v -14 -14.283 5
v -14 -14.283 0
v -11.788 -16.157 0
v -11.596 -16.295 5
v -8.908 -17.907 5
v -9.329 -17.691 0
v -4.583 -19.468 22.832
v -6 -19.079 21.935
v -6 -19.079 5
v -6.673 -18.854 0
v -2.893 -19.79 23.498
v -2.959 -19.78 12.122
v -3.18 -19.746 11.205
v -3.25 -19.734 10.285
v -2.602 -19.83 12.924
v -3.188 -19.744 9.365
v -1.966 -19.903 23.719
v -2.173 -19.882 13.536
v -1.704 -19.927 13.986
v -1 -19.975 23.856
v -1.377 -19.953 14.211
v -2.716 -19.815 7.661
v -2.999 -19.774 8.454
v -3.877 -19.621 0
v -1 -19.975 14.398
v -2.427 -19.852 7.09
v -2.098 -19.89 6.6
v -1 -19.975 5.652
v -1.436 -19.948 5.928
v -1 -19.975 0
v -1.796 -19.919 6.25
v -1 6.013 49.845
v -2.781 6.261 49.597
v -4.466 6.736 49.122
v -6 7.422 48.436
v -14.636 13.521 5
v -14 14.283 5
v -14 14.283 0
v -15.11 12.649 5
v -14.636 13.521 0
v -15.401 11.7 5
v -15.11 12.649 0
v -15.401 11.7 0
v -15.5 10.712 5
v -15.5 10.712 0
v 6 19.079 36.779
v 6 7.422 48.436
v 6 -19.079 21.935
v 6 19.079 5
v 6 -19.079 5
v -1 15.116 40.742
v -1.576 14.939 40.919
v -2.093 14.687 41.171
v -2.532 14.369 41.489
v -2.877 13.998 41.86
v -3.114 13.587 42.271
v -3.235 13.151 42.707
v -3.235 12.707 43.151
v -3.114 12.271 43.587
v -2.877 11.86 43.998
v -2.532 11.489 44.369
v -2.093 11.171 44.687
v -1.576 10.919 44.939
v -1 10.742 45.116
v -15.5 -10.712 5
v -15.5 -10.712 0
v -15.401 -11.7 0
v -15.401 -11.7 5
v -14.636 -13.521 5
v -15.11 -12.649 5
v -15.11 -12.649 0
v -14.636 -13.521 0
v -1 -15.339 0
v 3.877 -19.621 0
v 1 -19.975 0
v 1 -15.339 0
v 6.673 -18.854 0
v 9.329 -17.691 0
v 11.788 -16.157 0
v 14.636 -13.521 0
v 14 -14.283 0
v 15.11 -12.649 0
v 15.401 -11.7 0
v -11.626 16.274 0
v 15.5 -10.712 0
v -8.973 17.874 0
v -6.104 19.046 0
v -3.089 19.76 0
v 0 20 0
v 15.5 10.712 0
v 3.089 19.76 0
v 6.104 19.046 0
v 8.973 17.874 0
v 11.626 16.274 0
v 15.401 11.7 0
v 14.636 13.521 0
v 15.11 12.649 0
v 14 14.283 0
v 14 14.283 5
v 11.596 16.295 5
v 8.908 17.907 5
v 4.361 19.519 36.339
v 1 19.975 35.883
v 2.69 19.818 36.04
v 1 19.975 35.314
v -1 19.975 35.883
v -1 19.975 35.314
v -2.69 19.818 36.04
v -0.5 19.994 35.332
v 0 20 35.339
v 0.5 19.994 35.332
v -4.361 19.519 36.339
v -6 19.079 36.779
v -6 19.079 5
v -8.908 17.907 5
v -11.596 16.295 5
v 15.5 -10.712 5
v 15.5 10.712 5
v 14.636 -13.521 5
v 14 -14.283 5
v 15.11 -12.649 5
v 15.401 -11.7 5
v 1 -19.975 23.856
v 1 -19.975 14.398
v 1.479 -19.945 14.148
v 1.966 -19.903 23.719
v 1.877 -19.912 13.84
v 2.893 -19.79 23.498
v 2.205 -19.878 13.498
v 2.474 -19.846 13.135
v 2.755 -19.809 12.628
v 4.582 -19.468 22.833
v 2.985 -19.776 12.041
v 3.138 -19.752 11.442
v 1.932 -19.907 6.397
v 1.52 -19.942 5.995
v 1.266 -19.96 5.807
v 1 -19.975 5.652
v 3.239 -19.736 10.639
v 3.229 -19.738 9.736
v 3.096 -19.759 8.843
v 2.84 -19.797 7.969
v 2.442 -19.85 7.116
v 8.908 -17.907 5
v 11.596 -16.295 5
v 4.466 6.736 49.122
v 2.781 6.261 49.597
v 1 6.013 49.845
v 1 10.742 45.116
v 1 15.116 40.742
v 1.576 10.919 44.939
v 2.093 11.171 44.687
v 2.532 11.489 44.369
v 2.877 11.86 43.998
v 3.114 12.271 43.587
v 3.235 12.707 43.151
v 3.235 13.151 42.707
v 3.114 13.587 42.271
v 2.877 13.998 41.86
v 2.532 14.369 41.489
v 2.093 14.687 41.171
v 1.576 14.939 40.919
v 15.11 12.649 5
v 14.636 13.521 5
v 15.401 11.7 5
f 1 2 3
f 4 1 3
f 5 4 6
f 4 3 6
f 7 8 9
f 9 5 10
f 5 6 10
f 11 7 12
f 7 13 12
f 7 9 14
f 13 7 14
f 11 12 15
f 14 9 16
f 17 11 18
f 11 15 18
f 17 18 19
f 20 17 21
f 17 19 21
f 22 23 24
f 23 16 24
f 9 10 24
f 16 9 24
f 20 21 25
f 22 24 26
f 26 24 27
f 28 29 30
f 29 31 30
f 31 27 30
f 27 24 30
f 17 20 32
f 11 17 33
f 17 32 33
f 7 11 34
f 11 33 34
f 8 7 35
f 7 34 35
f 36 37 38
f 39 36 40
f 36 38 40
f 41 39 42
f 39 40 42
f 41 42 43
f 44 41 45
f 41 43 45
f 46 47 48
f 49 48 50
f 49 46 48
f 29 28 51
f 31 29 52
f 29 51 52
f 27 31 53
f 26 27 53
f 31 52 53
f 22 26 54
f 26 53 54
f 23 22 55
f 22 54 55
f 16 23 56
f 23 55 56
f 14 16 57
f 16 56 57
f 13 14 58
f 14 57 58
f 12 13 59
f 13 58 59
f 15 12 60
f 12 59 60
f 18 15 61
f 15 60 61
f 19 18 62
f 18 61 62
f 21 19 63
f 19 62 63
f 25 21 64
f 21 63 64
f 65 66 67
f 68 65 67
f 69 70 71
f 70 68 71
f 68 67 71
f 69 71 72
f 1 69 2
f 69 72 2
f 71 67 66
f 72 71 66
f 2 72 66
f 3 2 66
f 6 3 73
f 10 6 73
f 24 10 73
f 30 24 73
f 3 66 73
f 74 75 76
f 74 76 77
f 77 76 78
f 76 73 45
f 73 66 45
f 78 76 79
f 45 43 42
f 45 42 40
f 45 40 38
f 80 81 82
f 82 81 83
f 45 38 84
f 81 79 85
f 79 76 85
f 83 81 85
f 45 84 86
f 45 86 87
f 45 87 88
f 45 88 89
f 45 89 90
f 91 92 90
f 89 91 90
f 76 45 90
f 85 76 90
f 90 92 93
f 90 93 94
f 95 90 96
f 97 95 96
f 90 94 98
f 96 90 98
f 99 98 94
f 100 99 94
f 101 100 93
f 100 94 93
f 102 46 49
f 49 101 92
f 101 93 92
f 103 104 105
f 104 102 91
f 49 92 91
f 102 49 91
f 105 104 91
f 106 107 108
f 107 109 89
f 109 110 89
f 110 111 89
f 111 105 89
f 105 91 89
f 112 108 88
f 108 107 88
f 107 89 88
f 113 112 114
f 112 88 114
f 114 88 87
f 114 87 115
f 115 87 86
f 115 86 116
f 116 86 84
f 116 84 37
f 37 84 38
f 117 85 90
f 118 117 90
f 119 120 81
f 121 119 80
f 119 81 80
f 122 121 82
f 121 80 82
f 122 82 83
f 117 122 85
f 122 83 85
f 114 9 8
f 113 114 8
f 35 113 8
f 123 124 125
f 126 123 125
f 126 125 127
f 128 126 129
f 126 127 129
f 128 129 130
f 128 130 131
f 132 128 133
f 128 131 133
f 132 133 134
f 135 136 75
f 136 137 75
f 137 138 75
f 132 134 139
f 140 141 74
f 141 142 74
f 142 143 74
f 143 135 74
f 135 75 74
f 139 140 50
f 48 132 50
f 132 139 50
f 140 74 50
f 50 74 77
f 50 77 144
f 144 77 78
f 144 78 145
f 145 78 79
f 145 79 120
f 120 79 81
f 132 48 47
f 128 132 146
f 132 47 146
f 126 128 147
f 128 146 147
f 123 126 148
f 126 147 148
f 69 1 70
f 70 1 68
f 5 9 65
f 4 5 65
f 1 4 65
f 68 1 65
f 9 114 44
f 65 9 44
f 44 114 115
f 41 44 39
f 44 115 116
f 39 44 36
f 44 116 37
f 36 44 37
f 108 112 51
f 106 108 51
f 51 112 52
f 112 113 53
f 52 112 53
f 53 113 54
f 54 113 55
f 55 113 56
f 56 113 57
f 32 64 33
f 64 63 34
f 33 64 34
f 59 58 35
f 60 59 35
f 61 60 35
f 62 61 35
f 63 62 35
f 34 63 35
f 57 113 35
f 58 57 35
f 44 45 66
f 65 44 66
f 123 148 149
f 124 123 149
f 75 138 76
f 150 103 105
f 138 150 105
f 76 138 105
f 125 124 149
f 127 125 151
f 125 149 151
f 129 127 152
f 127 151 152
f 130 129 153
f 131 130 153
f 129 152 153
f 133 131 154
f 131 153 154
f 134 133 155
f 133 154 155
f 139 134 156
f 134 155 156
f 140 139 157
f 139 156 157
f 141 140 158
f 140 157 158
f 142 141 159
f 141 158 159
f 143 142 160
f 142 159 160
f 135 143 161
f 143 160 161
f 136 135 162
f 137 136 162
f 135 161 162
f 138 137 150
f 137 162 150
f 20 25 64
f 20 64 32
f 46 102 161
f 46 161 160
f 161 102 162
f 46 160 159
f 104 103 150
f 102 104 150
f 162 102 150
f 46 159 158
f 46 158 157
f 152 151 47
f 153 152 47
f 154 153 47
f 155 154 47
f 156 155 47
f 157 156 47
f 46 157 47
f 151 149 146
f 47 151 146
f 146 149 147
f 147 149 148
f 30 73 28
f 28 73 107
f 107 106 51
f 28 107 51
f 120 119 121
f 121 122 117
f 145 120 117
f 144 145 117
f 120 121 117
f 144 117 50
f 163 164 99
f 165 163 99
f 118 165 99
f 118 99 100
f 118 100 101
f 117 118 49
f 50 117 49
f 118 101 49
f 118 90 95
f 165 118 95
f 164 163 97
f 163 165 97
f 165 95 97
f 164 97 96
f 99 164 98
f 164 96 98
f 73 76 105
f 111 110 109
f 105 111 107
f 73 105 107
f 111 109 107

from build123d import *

# Parameters (mm, degrees)
BOSS_EXTRUDE1_DEPTH     = 50
CUT_EXTRUDE2_DEPTH      = 21
CUT_EXTRUDE2_DEPTH_BACK = 21
CUT_EXTRUDE3_DEPTH      = 10.5
CUT_EXTRUDE3_DEPTH_BACK = 22.5
CUT_EXTRUDE4_DEPTH      = 54.639610307


with BuildPart() as part:
    # Sketch1 → Boss-Extrude1 (new body)
    with BuildSketch(Plane.XY):
        with BuildLine():
            Line((-15.5, 10.712142643), (-15.5, -10.712142643))
            ThreePointArc((-15.5, -10.712142643), (-15.109772229, -12.648634316), (-14, -14.282856857))
            ThreePointArc((-14, -14.282856857), (0, -20), (14, -14.282856857))
            ThreePointArc((14, -14.282856857), (15.109772229, -12.648634316), (15.5, -10.712142643))
            Line((15.5, -10.712142643), (15.5, 10.712142643))
            ThreePointArc((15.5, 10.712142643), (15.109772229, 12.648634316), (14, 14.282856857))
            ThreePointArc((14, 14.282856857), (0, 20), (-14, 14.282856857))
            ThreePointArc((-14, 14.282856857), (-15.109772229, 12.648634316), (-15.5, 10.712142643))
        make_face()
    extrude(amount=BOSS_EXTRUDE1_DEPTH)

    # Sketch3 → Cut-Extrude2 (cut, two sides)
    with BuildSketch(Plane(origin=(0, 0, 0), x_dir=(1, 0, 0), z_dir=(0, 1, 0))) as cut_extrude2_sk:
        Polygon((-142.514750581, -5), (-18.067603989, -5), (-6, -5), (-6, -53.756778028), (6, -53.756778028), (6, -5), (19.848795464, -5), (144.295942056, -5), (144.295942056, -253.894293184), (-142.514750581, -253.894293184), align=None)
    extrude(amount=CUT_EXTRUDE2_DEPTH, mode=Mode.SUBTRACT)
    extrude(cut_extrude2_sk.sketch, amount=-CUT_EXTRUDE2_DEPTH_BACK, mode=Mode.SUBTRACT)

    # Sketch4 → Cut-Extrude3 (cut, two sides)
    with BuildSketch(Plane.ZY.offset(6)) as cut_extrude3_sk:
        Polygon((143.928068638, -88.070204261), (54.263494486, 1.594369891), (31.585867619, 24.271996758), (-58.078706533, 113.93657091), (121.250441771, 293.265719213), (323.257216942, 91.258944042), align=None)
    extrude(amount=CUT_EXTRUDE3_DEPTH, mode=Mode.SUBTRACT)
    extrude(cut_extrude3_sk.sketch, amount=-CUT_EXTRUDE3_DEPTH_BACK, mode=Mode.SUBTRACT)

    # Sketch5 → Cut-Extrude4 (cut, through all)
    with BuildSketch(Plane(origin=(0, 27.928932188, 27.928932188), x_dir=(1, 0, 0), z_dir=(0, 0.707106781, 0.707106781))):
        with BuildLine():
            Line((-7.514532889, -27.552153908), (-7.514532889, -51.5106924))
            Line((-7.514532889, -51.5106924), (9.293928827, -51.5106924))
            Line((9.293928827, -51.5106924), (9.293928827, -24.418415532))
            ThreePointArc((9.293928827, -24.418415532), (6.107254228, -28.917224685), (1, -30.993310676))
            Line((1, -30.993310676), (1, -24.305532655))
            ThreePointArc((1, -24.305532655), (3.25, -21.213203436), (1, -18.120874216))
            Line((1, -18.120874216), (1, -10.845979058))
            Line((1, -10.845979058), (-1, -10.845979058))
            Line((-1, -10.845979058), (-1, -18.120874216))
            ThreePointArc((-1, -18.120874216), (-3.25, -21.213203436), (-1, -24.305532655))
            Line((-1, -24.305532655), (-1, -30.993310676))
            ThreePointArc((-1, -30.993310676), (-4.591808745, -29.906062003), (-7.514532889, -27.552153908))
        make_face()
    extrude(amount=-CUT_EXTRUDE4_DEPTH, mode=Mode.SUBTRACT)


solid = part.part
